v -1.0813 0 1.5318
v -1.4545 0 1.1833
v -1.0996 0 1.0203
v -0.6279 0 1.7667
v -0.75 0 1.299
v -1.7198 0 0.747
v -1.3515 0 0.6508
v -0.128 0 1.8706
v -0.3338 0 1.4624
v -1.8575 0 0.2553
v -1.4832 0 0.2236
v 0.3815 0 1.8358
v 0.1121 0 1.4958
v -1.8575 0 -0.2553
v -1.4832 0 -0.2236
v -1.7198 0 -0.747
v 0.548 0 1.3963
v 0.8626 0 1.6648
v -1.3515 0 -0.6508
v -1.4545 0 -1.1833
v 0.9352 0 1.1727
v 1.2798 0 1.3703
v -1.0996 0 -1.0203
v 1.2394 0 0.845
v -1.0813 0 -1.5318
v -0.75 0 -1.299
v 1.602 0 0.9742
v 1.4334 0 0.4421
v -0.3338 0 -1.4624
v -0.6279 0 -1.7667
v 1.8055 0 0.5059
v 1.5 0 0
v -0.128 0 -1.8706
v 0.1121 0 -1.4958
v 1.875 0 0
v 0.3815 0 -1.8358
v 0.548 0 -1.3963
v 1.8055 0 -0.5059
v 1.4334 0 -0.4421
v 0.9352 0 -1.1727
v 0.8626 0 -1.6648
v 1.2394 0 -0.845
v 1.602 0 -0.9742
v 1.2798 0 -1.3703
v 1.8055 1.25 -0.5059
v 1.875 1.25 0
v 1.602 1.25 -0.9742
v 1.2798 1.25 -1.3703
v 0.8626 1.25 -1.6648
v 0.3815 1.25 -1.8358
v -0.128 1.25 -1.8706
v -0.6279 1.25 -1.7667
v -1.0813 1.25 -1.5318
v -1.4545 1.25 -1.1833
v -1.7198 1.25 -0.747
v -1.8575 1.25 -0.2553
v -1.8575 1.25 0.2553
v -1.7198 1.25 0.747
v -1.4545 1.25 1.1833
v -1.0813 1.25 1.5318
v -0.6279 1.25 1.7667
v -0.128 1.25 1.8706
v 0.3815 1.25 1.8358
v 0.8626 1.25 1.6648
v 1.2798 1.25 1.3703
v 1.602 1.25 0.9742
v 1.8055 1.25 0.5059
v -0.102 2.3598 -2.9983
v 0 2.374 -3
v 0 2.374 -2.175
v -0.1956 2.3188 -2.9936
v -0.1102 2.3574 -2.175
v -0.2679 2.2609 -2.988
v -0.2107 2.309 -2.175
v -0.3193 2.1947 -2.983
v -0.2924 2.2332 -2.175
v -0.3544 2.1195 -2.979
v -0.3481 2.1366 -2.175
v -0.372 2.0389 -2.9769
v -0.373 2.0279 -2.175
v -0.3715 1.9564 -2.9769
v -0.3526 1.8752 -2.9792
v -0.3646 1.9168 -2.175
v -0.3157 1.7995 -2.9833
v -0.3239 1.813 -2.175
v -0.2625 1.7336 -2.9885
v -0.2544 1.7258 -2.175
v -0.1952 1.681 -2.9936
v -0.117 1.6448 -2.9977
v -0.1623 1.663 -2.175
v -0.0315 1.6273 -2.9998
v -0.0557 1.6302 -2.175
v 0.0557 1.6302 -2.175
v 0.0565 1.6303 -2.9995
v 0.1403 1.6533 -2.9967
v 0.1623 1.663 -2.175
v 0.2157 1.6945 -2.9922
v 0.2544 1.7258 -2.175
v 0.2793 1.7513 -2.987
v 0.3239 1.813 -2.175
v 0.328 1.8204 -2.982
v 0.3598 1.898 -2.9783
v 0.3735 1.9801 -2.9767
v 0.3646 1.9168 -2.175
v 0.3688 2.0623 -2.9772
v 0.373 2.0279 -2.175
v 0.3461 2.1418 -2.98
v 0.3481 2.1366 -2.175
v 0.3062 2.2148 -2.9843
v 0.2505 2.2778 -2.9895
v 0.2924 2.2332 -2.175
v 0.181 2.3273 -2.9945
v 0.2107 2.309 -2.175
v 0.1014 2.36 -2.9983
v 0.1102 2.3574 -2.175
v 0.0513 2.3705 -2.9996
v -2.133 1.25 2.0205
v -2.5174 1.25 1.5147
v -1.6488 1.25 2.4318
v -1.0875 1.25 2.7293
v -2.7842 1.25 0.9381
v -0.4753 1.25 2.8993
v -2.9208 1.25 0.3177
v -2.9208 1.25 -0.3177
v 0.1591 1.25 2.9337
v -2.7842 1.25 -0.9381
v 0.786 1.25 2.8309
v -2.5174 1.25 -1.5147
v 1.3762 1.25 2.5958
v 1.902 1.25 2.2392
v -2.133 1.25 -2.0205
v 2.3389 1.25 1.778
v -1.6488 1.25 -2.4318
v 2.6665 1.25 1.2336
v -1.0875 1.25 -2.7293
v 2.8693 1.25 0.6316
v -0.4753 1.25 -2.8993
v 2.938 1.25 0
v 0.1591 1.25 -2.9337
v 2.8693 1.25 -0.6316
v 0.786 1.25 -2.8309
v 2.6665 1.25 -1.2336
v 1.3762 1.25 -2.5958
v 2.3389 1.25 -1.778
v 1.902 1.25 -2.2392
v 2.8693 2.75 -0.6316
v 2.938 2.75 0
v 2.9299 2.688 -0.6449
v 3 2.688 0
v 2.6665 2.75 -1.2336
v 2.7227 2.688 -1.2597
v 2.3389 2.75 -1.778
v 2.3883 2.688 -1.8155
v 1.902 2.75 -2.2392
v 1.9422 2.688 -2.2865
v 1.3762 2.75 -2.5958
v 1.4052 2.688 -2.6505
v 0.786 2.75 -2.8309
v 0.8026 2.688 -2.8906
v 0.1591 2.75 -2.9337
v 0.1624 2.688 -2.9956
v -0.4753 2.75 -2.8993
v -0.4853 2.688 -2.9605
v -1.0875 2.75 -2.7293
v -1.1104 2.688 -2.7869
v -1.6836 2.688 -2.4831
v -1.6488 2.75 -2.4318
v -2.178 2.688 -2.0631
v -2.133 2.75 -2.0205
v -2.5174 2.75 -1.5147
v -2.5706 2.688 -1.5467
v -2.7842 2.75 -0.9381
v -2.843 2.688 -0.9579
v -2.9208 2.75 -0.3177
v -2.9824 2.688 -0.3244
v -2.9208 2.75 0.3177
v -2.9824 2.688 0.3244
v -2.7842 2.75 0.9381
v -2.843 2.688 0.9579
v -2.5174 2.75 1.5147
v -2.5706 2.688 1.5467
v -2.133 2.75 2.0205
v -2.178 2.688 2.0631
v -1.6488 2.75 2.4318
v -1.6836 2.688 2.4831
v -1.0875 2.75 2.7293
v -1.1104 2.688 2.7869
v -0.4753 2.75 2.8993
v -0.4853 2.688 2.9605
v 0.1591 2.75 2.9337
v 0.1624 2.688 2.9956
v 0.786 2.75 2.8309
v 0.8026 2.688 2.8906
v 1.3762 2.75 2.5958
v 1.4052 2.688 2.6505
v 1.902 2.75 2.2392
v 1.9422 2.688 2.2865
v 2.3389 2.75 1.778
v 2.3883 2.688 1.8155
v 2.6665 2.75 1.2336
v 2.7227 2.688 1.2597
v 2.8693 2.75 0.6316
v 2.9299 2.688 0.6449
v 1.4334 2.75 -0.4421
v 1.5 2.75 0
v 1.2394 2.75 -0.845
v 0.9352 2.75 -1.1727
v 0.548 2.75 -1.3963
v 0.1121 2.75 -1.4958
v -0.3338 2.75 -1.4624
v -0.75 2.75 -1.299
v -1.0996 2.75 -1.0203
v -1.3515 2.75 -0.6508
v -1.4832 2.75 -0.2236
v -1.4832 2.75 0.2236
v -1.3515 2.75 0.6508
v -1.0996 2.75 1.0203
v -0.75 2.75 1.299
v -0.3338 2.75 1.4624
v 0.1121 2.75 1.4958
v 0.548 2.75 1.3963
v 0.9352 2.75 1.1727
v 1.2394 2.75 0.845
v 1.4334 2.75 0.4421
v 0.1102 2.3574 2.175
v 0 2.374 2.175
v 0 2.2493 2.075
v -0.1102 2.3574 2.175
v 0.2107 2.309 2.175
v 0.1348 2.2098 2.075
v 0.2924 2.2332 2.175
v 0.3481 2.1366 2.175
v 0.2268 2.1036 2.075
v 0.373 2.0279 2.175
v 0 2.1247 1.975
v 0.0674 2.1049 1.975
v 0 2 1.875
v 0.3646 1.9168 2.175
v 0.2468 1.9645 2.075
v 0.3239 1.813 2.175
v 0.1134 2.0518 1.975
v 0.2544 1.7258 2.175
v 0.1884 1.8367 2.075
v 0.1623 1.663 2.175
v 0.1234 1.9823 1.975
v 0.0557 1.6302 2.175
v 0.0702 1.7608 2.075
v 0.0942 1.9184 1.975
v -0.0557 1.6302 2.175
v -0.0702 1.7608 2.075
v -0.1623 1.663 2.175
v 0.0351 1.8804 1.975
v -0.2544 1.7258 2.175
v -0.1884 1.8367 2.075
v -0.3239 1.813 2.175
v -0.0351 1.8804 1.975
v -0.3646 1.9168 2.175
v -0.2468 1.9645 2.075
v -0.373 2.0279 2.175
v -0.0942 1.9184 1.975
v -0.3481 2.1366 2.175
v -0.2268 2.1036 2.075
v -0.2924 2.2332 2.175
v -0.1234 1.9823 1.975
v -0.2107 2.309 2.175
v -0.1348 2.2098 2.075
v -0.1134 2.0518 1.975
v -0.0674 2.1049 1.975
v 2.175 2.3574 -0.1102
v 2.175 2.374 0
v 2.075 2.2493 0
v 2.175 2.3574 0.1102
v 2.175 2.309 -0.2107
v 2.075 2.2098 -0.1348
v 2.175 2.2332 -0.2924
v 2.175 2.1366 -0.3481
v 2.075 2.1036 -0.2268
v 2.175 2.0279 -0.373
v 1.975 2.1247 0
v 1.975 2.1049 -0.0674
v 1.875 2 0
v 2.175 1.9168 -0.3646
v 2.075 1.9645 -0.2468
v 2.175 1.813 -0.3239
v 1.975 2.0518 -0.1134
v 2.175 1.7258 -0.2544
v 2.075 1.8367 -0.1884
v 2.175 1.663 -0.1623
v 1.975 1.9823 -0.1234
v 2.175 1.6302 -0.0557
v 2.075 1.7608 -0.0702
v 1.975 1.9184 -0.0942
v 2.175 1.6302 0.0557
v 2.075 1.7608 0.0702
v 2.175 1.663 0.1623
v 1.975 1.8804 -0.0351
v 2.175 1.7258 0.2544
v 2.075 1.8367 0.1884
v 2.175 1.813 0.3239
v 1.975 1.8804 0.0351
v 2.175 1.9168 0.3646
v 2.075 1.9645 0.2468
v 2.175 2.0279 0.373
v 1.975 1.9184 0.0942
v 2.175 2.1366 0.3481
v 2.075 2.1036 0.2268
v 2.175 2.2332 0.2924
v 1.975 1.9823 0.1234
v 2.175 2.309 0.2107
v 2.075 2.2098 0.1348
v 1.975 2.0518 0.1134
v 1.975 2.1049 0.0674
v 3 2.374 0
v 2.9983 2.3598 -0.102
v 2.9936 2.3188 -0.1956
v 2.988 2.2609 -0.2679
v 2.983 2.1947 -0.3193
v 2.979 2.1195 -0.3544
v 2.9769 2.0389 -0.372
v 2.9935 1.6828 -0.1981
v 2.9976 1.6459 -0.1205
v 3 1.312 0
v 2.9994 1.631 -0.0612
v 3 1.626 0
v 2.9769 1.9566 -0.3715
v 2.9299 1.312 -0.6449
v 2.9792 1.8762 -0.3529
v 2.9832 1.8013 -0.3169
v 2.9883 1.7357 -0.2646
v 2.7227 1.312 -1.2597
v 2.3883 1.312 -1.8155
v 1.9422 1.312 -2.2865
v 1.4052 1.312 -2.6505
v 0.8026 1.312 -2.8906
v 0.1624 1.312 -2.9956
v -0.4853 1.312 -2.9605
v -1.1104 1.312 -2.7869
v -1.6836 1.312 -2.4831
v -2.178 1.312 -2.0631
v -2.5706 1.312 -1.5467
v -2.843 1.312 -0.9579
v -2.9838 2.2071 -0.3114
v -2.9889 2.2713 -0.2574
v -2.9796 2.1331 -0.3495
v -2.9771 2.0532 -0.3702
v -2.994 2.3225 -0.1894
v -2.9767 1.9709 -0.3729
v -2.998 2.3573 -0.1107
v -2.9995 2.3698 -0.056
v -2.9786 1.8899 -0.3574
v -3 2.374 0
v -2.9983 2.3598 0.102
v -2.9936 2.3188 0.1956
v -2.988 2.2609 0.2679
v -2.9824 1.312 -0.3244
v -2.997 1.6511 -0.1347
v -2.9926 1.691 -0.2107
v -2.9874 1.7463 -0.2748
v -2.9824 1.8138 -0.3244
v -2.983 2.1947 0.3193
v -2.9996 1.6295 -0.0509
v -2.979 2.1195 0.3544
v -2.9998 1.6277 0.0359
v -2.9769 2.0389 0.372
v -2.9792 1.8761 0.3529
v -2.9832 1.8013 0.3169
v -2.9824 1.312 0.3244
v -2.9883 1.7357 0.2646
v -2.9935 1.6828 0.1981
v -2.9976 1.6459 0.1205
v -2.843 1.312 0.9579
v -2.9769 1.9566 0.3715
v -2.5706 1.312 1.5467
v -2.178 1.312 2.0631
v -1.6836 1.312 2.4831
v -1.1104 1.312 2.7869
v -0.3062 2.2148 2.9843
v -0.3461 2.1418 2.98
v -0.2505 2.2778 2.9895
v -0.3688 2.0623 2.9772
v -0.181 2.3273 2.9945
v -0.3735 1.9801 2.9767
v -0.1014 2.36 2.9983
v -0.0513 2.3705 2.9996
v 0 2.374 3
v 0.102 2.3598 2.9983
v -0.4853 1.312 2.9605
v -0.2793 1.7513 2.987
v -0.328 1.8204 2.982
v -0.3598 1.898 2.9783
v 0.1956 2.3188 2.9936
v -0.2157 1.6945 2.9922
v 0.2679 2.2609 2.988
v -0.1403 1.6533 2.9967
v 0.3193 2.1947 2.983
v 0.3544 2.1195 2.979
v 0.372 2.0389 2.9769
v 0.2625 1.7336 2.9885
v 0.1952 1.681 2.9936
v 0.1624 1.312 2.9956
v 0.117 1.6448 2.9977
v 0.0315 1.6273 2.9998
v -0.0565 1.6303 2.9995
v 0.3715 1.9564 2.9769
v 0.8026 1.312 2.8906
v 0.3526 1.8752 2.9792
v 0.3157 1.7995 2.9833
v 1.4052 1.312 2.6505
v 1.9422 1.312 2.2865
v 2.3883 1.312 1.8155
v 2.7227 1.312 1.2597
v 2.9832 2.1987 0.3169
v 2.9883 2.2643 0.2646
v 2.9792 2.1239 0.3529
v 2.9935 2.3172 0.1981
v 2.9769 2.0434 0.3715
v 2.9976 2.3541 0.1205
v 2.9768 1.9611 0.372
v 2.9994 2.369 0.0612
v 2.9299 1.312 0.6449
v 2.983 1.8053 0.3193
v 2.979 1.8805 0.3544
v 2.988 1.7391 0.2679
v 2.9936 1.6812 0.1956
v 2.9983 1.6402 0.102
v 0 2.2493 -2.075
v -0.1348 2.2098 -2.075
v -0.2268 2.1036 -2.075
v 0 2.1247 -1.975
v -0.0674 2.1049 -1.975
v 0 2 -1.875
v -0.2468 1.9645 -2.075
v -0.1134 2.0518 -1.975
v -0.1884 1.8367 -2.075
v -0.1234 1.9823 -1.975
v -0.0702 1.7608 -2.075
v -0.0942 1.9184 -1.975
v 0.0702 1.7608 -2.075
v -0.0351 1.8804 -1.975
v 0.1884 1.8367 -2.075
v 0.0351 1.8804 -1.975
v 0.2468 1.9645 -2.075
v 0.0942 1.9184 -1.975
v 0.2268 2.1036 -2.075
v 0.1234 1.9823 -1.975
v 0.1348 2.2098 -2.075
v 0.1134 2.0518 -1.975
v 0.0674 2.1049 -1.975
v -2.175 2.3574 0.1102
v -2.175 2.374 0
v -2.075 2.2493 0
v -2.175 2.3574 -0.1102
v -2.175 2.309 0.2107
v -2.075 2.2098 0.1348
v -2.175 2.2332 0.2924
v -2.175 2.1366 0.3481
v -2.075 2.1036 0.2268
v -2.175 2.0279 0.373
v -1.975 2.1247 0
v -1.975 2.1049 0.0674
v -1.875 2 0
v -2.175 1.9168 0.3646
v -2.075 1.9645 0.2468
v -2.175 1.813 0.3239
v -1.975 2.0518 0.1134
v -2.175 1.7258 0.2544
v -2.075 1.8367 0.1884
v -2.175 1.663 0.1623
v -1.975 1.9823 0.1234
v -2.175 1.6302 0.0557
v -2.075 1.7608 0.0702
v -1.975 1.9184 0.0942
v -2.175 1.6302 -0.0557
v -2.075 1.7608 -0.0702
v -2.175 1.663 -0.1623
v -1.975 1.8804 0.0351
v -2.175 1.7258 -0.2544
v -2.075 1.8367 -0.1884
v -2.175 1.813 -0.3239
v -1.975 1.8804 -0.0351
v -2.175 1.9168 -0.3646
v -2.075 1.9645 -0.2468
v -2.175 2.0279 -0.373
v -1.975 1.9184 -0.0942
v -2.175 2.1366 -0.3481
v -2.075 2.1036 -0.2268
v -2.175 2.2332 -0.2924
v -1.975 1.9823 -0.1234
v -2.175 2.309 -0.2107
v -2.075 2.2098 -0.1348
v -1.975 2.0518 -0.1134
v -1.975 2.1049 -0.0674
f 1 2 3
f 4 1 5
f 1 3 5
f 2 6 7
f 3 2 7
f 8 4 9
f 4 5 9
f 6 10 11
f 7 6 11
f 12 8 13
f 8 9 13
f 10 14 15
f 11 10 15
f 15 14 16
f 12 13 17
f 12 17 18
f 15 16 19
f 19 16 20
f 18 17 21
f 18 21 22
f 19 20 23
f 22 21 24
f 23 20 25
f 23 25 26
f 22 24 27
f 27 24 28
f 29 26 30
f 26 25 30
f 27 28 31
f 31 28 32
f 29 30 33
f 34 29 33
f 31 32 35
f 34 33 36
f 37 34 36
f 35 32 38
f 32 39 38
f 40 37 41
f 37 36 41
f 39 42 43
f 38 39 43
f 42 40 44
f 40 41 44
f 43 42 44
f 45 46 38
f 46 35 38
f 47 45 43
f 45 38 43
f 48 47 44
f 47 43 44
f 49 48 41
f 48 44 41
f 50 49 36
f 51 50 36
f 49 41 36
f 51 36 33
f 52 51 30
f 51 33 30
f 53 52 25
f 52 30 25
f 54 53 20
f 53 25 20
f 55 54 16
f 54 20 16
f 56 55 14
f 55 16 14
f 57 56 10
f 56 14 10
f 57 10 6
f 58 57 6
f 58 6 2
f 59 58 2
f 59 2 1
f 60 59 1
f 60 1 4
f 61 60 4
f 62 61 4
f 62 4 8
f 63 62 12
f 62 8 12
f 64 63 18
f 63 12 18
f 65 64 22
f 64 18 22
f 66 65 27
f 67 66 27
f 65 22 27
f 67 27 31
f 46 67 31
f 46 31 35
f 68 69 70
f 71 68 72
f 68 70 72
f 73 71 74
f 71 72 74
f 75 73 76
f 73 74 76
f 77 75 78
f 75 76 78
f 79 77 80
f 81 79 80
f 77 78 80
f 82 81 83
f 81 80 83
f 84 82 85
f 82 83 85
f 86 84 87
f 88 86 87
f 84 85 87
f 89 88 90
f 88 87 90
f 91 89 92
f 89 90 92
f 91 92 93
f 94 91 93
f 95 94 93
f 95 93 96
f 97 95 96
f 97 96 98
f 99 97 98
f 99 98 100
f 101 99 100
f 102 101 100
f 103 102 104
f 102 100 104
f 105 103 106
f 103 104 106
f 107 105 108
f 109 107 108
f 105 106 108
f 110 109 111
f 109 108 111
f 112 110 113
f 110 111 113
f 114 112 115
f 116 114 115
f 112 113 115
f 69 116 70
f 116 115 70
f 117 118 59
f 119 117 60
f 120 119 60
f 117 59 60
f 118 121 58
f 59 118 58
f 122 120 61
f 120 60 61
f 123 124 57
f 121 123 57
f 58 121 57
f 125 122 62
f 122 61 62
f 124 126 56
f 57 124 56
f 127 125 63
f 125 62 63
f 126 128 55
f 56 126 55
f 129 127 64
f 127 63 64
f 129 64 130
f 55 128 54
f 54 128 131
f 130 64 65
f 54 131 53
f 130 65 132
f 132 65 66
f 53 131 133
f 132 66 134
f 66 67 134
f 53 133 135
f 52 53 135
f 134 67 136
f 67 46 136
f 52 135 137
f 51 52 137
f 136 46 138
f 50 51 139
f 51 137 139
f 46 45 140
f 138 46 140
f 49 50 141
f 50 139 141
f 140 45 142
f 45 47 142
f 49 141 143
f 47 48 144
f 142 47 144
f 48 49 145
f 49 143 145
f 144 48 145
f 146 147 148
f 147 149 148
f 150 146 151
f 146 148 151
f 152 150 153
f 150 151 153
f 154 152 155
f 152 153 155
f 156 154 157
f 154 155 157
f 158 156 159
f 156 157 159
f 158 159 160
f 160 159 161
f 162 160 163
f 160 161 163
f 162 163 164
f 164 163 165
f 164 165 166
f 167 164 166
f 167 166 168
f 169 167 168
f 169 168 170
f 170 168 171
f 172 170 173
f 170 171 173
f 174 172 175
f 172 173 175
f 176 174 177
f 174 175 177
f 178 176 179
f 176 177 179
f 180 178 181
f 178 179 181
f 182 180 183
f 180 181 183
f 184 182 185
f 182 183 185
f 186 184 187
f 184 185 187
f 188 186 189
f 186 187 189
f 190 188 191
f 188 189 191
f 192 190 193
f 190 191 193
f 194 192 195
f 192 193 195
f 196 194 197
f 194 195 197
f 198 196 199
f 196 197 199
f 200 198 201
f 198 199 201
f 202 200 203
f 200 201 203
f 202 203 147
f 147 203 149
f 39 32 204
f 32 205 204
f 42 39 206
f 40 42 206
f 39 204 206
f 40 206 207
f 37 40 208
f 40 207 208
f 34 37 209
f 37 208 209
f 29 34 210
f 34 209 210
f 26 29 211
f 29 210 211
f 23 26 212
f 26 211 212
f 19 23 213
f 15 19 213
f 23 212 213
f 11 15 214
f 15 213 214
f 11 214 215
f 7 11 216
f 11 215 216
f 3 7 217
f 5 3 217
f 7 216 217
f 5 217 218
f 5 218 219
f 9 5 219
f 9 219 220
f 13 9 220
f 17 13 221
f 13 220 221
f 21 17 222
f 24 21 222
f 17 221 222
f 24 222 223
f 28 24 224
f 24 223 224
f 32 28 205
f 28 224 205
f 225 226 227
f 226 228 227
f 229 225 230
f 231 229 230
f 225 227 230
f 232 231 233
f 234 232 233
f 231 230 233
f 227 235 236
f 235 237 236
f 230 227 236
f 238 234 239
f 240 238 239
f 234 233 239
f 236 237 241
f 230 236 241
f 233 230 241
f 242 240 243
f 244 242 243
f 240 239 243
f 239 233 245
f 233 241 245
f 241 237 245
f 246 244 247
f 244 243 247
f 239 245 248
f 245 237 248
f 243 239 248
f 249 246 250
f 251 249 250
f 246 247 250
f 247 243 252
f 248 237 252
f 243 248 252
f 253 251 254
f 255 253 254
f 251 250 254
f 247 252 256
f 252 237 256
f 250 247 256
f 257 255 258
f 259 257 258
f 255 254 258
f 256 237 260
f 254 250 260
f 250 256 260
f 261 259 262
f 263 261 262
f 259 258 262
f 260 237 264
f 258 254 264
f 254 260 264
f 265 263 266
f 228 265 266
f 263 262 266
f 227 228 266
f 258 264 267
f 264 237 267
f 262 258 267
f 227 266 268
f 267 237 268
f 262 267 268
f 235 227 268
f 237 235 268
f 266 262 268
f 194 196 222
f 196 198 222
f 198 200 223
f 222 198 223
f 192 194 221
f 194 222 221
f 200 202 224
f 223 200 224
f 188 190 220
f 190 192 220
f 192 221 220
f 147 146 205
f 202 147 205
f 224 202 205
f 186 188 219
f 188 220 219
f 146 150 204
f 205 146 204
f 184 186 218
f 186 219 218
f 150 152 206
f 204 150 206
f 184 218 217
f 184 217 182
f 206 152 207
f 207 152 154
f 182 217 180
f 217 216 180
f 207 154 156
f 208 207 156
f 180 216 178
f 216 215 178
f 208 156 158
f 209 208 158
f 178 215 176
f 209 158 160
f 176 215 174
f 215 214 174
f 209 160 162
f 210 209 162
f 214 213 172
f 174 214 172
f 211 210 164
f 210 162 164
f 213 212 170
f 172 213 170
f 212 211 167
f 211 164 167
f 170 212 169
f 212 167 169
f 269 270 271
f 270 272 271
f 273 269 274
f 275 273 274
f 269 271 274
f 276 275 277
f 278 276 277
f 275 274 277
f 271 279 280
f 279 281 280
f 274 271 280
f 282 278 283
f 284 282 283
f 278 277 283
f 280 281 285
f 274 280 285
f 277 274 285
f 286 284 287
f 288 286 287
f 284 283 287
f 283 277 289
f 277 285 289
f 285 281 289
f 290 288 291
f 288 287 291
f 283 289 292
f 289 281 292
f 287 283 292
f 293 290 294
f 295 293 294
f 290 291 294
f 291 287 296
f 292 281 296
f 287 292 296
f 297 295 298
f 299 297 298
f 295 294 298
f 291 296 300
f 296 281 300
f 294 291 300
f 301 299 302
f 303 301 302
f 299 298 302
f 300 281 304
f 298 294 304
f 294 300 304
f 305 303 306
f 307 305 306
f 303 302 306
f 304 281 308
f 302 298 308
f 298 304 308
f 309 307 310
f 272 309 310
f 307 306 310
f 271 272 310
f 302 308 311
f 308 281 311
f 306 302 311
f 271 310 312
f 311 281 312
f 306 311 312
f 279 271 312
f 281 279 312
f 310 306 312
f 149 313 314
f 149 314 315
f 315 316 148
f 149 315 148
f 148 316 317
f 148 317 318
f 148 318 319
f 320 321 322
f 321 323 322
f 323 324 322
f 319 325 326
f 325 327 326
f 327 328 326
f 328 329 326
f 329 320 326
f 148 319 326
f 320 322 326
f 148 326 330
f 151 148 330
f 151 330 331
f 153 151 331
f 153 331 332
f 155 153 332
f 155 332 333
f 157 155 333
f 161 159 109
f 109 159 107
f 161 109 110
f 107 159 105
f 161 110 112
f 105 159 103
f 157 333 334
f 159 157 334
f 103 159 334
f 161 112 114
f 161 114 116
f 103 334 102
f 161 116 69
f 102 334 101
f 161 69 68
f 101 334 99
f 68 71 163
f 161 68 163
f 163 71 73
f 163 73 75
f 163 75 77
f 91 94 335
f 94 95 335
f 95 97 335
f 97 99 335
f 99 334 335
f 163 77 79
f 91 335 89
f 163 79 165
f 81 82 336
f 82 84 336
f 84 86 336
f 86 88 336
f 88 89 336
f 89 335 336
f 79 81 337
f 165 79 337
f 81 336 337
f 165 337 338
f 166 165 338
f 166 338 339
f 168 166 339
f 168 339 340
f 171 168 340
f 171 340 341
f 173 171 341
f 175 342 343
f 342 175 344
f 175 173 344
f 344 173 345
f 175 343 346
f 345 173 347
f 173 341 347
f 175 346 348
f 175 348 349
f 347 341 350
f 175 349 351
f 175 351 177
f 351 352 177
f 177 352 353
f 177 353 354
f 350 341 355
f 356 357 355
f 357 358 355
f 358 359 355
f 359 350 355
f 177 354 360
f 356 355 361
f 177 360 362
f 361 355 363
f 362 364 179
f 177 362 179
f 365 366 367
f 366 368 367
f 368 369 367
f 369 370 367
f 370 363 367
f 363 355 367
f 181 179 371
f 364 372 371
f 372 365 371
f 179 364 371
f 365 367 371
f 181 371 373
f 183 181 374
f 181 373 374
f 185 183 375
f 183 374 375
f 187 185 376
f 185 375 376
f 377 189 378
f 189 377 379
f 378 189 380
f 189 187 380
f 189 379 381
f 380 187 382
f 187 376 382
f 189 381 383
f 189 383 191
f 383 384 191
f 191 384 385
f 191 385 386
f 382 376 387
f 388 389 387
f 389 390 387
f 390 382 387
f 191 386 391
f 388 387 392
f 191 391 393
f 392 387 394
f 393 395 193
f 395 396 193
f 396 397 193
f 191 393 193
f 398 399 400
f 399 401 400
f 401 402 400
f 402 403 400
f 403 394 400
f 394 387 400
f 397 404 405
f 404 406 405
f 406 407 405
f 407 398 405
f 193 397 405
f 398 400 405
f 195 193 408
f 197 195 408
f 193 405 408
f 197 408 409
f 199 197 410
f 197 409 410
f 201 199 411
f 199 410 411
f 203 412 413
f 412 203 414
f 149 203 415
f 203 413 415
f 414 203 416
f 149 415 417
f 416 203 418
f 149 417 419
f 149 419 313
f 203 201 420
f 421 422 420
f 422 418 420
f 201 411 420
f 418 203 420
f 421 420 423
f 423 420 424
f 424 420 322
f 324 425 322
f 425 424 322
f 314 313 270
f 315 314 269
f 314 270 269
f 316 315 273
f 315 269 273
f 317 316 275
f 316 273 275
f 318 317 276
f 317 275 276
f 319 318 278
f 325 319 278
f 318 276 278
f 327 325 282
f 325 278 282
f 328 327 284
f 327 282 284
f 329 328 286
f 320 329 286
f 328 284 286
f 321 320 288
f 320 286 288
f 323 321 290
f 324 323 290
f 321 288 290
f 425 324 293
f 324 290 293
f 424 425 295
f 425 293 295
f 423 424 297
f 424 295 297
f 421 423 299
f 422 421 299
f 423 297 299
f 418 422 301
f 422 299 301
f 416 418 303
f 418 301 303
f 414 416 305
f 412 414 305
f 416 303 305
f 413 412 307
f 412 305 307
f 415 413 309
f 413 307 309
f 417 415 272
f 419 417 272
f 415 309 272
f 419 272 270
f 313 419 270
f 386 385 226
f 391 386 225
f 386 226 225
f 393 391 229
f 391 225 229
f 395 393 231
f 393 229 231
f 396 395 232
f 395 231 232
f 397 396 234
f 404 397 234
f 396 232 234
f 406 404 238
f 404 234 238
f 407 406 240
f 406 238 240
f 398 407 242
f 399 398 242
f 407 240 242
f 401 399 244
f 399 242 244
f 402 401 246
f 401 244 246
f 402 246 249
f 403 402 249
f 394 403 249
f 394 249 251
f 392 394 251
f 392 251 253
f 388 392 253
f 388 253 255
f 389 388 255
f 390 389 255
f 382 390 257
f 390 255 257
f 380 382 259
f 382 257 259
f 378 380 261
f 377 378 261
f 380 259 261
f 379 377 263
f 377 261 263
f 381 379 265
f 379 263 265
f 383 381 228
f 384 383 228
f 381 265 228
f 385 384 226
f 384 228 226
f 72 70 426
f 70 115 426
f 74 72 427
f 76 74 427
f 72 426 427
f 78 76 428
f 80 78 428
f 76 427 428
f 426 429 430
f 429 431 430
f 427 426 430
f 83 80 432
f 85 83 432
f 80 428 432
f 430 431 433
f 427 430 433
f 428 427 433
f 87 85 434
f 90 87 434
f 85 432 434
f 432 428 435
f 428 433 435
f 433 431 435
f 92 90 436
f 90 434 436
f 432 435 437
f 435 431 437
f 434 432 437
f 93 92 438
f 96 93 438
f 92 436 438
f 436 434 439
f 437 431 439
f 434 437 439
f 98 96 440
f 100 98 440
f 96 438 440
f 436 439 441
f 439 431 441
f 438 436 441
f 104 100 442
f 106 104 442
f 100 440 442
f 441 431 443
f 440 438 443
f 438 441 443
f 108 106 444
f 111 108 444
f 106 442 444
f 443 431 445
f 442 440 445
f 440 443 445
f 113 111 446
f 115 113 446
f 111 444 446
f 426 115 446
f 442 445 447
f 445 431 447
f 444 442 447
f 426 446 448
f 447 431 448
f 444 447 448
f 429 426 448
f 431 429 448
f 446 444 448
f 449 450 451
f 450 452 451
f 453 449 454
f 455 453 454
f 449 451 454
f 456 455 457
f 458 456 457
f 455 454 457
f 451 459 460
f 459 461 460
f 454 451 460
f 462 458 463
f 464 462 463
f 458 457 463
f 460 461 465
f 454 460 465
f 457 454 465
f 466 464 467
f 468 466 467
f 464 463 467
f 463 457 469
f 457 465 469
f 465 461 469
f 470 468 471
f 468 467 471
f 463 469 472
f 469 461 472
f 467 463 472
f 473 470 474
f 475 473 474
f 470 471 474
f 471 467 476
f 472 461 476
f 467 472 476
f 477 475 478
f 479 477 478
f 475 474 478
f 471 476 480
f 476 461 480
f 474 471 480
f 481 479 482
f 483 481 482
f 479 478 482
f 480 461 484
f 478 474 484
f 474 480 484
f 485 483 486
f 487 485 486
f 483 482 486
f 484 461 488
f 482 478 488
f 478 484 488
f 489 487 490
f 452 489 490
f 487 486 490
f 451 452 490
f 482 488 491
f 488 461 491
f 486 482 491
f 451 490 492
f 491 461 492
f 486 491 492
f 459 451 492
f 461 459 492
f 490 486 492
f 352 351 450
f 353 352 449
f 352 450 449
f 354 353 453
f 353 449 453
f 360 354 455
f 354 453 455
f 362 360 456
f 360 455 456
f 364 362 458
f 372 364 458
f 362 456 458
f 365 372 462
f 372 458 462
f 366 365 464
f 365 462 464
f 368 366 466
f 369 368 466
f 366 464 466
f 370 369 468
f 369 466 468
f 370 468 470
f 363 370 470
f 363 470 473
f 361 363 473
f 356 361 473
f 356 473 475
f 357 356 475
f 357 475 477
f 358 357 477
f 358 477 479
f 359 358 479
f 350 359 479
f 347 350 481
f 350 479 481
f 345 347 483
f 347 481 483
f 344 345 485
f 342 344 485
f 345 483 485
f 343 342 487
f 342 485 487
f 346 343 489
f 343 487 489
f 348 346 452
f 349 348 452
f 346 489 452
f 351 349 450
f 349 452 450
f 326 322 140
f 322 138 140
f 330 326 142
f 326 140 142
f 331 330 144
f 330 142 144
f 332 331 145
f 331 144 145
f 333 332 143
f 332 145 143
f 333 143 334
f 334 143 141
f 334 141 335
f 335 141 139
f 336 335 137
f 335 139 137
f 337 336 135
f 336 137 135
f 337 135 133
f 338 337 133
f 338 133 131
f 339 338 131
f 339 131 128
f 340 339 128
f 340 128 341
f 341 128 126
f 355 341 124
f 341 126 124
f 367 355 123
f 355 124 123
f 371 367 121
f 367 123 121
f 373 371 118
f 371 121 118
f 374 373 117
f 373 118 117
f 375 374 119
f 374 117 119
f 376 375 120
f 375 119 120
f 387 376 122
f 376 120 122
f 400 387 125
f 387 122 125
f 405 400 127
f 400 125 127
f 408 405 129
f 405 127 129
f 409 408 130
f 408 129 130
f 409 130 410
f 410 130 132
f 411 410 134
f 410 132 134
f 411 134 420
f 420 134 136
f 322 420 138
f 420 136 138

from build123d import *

# Parameters (mm, degrees)
CIRPATTERN1_COUNT = 4


with BuildPart() as part:
    # Sketch1 → Revolve2 (revolve)
    with BuildSketch(Plane.XY):
        Polygon((1.5, 0), (1.5, 2.75), (2.938, 2.75), (3, 2.688), (3, 1.312), (2.938, 1.25), (1.875, 1.25), (1.875, 0), align=None)
    revolve(axis=Axis((0, 0, 0), (0, 1, 0)))

    # Sketch4 → Cut-Revolve1 (revolve, cut)
    with BuildSketch(Plane.XY):
        Polygon((-3.475, 2.374), (-2.175, 2.374), (-1.875, 2), (-3.475, 2), align=None)
    cut_revolve1 = revolve(axis=Axis((-3.475, 2, 0), (1, 0, 0)), mode=Mode.SUBTRACT)

    # CirPattern1: Cut-Revolve1 ×4 about axis
    cirpattern1_axis = Axis((0, 2.75, 0), (0, -1, 0))
    for i in range(1, CIRPATTERN1_COUNT):
        add(cut_revolve1.rotate(cirpattern1_axis, i * 360 / CIRPATTERN1_COUNT), mode=Mode.SUBTRACT)


solid = part.part
